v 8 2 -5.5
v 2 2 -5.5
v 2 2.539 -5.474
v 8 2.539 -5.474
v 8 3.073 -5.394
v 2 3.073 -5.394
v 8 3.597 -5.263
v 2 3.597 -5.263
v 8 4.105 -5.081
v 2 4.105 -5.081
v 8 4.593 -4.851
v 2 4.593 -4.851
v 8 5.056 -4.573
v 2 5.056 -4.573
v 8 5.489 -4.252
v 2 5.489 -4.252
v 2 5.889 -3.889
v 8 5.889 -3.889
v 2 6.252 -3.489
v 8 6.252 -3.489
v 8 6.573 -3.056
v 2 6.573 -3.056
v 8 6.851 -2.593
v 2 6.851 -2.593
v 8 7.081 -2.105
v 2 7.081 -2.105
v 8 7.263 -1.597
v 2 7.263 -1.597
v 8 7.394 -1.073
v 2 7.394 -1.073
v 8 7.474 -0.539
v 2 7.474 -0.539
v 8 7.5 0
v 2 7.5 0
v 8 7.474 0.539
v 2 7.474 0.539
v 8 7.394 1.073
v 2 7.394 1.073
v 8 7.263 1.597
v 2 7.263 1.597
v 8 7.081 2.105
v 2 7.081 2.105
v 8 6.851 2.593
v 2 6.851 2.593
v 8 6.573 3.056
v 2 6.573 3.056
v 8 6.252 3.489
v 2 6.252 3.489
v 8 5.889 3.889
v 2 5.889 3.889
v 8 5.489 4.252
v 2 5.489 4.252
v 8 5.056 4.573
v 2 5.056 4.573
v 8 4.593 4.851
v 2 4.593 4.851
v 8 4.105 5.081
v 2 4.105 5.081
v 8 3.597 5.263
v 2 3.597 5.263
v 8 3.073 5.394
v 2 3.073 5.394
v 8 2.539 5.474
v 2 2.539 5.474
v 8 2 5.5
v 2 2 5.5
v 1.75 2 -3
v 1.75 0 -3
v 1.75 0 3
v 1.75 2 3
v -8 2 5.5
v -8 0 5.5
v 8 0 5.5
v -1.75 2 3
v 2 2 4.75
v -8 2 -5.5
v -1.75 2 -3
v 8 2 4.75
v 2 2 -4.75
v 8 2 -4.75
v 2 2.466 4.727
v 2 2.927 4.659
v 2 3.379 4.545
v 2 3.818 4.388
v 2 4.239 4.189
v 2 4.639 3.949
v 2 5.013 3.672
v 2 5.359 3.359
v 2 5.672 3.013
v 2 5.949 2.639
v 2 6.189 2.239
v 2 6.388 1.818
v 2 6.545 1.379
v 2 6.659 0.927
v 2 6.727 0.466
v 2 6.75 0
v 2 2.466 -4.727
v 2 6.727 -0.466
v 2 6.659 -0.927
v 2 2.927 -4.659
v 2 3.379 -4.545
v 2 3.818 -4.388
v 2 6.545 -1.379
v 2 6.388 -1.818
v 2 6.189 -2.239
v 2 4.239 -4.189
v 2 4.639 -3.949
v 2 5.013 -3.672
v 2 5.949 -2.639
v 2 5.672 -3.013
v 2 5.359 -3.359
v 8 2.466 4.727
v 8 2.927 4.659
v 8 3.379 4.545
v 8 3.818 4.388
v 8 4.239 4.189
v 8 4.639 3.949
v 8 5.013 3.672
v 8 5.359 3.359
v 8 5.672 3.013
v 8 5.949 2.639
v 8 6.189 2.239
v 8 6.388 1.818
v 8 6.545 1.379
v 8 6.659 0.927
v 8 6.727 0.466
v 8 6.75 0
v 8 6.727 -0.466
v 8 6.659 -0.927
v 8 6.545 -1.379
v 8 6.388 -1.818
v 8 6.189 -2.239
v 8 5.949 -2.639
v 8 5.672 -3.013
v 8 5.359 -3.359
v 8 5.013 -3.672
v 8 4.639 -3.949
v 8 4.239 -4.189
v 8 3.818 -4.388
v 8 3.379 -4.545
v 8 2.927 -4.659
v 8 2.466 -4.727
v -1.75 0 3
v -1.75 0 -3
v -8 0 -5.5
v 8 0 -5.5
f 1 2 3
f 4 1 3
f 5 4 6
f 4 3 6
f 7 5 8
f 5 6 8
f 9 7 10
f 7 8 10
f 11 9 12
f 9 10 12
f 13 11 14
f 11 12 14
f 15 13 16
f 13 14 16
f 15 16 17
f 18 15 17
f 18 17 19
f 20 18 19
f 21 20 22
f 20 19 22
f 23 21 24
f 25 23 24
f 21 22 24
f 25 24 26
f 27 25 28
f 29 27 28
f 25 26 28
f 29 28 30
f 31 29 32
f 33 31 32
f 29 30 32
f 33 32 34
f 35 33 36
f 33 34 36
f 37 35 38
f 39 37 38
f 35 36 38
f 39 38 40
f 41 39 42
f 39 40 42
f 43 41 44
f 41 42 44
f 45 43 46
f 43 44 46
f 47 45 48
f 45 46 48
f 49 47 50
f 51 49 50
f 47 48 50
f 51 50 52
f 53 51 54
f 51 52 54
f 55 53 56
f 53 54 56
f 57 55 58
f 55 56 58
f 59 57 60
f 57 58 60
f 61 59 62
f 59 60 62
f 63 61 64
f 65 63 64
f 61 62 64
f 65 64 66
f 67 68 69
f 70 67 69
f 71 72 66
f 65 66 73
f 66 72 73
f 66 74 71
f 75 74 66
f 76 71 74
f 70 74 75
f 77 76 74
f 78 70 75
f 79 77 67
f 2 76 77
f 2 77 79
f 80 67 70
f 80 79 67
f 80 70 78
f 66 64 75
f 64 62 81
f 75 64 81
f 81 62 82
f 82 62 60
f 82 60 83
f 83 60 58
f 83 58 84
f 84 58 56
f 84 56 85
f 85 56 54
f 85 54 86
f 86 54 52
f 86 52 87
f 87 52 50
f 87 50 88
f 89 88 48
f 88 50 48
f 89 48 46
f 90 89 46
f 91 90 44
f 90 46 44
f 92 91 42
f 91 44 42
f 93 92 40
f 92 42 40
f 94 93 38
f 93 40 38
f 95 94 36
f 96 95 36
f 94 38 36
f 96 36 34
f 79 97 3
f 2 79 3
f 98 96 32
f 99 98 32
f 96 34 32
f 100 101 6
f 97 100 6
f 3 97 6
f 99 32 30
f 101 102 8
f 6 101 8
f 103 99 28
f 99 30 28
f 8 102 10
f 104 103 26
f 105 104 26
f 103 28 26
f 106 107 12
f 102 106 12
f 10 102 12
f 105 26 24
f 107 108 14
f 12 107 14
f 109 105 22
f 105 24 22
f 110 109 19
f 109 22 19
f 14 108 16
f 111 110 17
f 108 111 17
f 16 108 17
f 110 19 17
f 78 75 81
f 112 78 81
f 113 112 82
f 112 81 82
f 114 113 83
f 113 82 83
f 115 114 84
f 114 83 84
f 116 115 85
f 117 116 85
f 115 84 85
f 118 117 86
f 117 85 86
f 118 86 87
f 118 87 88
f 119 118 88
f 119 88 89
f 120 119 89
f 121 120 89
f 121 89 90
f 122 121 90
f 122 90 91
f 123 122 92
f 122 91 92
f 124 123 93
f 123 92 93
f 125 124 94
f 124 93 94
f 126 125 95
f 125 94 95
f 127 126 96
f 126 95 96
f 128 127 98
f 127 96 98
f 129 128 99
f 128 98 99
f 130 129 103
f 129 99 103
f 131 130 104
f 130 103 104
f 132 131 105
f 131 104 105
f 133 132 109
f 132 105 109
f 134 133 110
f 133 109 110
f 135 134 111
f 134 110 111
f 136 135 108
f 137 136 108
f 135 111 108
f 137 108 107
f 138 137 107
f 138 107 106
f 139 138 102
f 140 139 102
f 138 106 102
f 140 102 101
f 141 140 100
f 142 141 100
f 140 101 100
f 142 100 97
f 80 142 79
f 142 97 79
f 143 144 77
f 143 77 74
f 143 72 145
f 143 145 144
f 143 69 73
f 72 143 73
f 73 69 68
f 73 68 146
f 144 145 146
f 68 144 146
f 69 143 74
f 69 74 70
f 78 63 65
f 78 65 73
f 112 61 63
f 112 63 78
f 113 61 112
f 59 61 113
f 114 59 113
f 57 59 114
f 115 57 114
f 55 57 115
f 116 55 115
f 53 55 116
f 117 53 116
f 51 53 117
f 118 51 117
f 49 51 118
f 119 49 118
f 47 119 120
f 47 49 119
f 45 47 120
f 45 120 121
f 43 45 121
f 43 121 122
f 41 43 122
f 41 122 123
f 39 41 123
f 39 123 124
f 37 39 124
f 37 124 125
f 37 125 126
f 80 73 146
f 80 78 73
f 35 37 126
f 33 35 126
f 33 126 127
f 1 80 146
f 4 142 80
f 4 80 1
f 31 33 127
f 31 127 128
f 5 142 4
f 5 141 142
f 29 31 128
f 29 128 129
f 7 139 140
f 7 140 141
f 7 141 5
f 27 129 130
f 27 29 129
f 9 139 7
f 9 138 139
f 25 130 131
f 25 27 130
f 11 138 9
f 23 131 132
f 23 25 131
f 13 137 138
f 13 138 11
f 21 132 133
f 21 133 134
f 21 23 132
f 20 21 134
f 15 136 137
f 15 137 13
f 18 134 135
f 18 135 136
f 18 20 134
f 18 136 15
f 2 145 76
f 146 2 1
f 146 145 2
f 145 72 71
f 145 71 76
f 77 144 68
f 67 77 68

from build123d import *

# Parameters (mm, degrees)
SKETCH_1_W          = 16
SKETCH_1_H          = 11
EXTRUDE_1_DEPTH     = 2
EXTRUDE_START       = 2
EXTRUDE_2_DEPTH     = 6
SKETCH_3_W          = 3.5
SKETCH_3_H          = 6
CUT_EXTRUDE_1_DEPTH = 13.267844146


with BuildPart() as part:
    # 草图1 → 凸台-拉伸1 (new body)
    with BuildSketch(Plane(origin=(0, 0, 0), x_dir=(1, 0, 0), z_dir=(0, 1, 0))):
        Rectangle(SKETCH_1_W, SKETCH_1_H)
    extrude(amount=EXTRUDE_1_DEPTH)

    # 草图2 → 凸台-拉伸2 (add)
    with BuildSketch(Plane(origin=(0, 0, 0), x_dir=(0, 0, -1), z_dir=(1, 0, 0)).offset(EXTRUDE_START)):
        with BuildLine():
            Line((-5.5, 2), (-4.75, 2))
            ThreePointArc((-4.75, 2), (0, 6.75), (4.75, 2))
            Line((4.75, 2), (5.5, 2))
            ThreePointArc((5.5, 2), (0, 7.5), (-5.5, 2))
        make_face()
    extrude(amount=EXTRUDE_2_DEPTH)

    # 草图3 → 切除-拉伸1 (cut, through all)
    with BuildSketch(Plane.XZ):
        Rectangle(SKETCH_3_W, SKETCH_3_H)
    extrude(amount=-CUT_EXTRUDE_1_DEPTH, mode=Mode.SUBTRACT)


solid = part.part
